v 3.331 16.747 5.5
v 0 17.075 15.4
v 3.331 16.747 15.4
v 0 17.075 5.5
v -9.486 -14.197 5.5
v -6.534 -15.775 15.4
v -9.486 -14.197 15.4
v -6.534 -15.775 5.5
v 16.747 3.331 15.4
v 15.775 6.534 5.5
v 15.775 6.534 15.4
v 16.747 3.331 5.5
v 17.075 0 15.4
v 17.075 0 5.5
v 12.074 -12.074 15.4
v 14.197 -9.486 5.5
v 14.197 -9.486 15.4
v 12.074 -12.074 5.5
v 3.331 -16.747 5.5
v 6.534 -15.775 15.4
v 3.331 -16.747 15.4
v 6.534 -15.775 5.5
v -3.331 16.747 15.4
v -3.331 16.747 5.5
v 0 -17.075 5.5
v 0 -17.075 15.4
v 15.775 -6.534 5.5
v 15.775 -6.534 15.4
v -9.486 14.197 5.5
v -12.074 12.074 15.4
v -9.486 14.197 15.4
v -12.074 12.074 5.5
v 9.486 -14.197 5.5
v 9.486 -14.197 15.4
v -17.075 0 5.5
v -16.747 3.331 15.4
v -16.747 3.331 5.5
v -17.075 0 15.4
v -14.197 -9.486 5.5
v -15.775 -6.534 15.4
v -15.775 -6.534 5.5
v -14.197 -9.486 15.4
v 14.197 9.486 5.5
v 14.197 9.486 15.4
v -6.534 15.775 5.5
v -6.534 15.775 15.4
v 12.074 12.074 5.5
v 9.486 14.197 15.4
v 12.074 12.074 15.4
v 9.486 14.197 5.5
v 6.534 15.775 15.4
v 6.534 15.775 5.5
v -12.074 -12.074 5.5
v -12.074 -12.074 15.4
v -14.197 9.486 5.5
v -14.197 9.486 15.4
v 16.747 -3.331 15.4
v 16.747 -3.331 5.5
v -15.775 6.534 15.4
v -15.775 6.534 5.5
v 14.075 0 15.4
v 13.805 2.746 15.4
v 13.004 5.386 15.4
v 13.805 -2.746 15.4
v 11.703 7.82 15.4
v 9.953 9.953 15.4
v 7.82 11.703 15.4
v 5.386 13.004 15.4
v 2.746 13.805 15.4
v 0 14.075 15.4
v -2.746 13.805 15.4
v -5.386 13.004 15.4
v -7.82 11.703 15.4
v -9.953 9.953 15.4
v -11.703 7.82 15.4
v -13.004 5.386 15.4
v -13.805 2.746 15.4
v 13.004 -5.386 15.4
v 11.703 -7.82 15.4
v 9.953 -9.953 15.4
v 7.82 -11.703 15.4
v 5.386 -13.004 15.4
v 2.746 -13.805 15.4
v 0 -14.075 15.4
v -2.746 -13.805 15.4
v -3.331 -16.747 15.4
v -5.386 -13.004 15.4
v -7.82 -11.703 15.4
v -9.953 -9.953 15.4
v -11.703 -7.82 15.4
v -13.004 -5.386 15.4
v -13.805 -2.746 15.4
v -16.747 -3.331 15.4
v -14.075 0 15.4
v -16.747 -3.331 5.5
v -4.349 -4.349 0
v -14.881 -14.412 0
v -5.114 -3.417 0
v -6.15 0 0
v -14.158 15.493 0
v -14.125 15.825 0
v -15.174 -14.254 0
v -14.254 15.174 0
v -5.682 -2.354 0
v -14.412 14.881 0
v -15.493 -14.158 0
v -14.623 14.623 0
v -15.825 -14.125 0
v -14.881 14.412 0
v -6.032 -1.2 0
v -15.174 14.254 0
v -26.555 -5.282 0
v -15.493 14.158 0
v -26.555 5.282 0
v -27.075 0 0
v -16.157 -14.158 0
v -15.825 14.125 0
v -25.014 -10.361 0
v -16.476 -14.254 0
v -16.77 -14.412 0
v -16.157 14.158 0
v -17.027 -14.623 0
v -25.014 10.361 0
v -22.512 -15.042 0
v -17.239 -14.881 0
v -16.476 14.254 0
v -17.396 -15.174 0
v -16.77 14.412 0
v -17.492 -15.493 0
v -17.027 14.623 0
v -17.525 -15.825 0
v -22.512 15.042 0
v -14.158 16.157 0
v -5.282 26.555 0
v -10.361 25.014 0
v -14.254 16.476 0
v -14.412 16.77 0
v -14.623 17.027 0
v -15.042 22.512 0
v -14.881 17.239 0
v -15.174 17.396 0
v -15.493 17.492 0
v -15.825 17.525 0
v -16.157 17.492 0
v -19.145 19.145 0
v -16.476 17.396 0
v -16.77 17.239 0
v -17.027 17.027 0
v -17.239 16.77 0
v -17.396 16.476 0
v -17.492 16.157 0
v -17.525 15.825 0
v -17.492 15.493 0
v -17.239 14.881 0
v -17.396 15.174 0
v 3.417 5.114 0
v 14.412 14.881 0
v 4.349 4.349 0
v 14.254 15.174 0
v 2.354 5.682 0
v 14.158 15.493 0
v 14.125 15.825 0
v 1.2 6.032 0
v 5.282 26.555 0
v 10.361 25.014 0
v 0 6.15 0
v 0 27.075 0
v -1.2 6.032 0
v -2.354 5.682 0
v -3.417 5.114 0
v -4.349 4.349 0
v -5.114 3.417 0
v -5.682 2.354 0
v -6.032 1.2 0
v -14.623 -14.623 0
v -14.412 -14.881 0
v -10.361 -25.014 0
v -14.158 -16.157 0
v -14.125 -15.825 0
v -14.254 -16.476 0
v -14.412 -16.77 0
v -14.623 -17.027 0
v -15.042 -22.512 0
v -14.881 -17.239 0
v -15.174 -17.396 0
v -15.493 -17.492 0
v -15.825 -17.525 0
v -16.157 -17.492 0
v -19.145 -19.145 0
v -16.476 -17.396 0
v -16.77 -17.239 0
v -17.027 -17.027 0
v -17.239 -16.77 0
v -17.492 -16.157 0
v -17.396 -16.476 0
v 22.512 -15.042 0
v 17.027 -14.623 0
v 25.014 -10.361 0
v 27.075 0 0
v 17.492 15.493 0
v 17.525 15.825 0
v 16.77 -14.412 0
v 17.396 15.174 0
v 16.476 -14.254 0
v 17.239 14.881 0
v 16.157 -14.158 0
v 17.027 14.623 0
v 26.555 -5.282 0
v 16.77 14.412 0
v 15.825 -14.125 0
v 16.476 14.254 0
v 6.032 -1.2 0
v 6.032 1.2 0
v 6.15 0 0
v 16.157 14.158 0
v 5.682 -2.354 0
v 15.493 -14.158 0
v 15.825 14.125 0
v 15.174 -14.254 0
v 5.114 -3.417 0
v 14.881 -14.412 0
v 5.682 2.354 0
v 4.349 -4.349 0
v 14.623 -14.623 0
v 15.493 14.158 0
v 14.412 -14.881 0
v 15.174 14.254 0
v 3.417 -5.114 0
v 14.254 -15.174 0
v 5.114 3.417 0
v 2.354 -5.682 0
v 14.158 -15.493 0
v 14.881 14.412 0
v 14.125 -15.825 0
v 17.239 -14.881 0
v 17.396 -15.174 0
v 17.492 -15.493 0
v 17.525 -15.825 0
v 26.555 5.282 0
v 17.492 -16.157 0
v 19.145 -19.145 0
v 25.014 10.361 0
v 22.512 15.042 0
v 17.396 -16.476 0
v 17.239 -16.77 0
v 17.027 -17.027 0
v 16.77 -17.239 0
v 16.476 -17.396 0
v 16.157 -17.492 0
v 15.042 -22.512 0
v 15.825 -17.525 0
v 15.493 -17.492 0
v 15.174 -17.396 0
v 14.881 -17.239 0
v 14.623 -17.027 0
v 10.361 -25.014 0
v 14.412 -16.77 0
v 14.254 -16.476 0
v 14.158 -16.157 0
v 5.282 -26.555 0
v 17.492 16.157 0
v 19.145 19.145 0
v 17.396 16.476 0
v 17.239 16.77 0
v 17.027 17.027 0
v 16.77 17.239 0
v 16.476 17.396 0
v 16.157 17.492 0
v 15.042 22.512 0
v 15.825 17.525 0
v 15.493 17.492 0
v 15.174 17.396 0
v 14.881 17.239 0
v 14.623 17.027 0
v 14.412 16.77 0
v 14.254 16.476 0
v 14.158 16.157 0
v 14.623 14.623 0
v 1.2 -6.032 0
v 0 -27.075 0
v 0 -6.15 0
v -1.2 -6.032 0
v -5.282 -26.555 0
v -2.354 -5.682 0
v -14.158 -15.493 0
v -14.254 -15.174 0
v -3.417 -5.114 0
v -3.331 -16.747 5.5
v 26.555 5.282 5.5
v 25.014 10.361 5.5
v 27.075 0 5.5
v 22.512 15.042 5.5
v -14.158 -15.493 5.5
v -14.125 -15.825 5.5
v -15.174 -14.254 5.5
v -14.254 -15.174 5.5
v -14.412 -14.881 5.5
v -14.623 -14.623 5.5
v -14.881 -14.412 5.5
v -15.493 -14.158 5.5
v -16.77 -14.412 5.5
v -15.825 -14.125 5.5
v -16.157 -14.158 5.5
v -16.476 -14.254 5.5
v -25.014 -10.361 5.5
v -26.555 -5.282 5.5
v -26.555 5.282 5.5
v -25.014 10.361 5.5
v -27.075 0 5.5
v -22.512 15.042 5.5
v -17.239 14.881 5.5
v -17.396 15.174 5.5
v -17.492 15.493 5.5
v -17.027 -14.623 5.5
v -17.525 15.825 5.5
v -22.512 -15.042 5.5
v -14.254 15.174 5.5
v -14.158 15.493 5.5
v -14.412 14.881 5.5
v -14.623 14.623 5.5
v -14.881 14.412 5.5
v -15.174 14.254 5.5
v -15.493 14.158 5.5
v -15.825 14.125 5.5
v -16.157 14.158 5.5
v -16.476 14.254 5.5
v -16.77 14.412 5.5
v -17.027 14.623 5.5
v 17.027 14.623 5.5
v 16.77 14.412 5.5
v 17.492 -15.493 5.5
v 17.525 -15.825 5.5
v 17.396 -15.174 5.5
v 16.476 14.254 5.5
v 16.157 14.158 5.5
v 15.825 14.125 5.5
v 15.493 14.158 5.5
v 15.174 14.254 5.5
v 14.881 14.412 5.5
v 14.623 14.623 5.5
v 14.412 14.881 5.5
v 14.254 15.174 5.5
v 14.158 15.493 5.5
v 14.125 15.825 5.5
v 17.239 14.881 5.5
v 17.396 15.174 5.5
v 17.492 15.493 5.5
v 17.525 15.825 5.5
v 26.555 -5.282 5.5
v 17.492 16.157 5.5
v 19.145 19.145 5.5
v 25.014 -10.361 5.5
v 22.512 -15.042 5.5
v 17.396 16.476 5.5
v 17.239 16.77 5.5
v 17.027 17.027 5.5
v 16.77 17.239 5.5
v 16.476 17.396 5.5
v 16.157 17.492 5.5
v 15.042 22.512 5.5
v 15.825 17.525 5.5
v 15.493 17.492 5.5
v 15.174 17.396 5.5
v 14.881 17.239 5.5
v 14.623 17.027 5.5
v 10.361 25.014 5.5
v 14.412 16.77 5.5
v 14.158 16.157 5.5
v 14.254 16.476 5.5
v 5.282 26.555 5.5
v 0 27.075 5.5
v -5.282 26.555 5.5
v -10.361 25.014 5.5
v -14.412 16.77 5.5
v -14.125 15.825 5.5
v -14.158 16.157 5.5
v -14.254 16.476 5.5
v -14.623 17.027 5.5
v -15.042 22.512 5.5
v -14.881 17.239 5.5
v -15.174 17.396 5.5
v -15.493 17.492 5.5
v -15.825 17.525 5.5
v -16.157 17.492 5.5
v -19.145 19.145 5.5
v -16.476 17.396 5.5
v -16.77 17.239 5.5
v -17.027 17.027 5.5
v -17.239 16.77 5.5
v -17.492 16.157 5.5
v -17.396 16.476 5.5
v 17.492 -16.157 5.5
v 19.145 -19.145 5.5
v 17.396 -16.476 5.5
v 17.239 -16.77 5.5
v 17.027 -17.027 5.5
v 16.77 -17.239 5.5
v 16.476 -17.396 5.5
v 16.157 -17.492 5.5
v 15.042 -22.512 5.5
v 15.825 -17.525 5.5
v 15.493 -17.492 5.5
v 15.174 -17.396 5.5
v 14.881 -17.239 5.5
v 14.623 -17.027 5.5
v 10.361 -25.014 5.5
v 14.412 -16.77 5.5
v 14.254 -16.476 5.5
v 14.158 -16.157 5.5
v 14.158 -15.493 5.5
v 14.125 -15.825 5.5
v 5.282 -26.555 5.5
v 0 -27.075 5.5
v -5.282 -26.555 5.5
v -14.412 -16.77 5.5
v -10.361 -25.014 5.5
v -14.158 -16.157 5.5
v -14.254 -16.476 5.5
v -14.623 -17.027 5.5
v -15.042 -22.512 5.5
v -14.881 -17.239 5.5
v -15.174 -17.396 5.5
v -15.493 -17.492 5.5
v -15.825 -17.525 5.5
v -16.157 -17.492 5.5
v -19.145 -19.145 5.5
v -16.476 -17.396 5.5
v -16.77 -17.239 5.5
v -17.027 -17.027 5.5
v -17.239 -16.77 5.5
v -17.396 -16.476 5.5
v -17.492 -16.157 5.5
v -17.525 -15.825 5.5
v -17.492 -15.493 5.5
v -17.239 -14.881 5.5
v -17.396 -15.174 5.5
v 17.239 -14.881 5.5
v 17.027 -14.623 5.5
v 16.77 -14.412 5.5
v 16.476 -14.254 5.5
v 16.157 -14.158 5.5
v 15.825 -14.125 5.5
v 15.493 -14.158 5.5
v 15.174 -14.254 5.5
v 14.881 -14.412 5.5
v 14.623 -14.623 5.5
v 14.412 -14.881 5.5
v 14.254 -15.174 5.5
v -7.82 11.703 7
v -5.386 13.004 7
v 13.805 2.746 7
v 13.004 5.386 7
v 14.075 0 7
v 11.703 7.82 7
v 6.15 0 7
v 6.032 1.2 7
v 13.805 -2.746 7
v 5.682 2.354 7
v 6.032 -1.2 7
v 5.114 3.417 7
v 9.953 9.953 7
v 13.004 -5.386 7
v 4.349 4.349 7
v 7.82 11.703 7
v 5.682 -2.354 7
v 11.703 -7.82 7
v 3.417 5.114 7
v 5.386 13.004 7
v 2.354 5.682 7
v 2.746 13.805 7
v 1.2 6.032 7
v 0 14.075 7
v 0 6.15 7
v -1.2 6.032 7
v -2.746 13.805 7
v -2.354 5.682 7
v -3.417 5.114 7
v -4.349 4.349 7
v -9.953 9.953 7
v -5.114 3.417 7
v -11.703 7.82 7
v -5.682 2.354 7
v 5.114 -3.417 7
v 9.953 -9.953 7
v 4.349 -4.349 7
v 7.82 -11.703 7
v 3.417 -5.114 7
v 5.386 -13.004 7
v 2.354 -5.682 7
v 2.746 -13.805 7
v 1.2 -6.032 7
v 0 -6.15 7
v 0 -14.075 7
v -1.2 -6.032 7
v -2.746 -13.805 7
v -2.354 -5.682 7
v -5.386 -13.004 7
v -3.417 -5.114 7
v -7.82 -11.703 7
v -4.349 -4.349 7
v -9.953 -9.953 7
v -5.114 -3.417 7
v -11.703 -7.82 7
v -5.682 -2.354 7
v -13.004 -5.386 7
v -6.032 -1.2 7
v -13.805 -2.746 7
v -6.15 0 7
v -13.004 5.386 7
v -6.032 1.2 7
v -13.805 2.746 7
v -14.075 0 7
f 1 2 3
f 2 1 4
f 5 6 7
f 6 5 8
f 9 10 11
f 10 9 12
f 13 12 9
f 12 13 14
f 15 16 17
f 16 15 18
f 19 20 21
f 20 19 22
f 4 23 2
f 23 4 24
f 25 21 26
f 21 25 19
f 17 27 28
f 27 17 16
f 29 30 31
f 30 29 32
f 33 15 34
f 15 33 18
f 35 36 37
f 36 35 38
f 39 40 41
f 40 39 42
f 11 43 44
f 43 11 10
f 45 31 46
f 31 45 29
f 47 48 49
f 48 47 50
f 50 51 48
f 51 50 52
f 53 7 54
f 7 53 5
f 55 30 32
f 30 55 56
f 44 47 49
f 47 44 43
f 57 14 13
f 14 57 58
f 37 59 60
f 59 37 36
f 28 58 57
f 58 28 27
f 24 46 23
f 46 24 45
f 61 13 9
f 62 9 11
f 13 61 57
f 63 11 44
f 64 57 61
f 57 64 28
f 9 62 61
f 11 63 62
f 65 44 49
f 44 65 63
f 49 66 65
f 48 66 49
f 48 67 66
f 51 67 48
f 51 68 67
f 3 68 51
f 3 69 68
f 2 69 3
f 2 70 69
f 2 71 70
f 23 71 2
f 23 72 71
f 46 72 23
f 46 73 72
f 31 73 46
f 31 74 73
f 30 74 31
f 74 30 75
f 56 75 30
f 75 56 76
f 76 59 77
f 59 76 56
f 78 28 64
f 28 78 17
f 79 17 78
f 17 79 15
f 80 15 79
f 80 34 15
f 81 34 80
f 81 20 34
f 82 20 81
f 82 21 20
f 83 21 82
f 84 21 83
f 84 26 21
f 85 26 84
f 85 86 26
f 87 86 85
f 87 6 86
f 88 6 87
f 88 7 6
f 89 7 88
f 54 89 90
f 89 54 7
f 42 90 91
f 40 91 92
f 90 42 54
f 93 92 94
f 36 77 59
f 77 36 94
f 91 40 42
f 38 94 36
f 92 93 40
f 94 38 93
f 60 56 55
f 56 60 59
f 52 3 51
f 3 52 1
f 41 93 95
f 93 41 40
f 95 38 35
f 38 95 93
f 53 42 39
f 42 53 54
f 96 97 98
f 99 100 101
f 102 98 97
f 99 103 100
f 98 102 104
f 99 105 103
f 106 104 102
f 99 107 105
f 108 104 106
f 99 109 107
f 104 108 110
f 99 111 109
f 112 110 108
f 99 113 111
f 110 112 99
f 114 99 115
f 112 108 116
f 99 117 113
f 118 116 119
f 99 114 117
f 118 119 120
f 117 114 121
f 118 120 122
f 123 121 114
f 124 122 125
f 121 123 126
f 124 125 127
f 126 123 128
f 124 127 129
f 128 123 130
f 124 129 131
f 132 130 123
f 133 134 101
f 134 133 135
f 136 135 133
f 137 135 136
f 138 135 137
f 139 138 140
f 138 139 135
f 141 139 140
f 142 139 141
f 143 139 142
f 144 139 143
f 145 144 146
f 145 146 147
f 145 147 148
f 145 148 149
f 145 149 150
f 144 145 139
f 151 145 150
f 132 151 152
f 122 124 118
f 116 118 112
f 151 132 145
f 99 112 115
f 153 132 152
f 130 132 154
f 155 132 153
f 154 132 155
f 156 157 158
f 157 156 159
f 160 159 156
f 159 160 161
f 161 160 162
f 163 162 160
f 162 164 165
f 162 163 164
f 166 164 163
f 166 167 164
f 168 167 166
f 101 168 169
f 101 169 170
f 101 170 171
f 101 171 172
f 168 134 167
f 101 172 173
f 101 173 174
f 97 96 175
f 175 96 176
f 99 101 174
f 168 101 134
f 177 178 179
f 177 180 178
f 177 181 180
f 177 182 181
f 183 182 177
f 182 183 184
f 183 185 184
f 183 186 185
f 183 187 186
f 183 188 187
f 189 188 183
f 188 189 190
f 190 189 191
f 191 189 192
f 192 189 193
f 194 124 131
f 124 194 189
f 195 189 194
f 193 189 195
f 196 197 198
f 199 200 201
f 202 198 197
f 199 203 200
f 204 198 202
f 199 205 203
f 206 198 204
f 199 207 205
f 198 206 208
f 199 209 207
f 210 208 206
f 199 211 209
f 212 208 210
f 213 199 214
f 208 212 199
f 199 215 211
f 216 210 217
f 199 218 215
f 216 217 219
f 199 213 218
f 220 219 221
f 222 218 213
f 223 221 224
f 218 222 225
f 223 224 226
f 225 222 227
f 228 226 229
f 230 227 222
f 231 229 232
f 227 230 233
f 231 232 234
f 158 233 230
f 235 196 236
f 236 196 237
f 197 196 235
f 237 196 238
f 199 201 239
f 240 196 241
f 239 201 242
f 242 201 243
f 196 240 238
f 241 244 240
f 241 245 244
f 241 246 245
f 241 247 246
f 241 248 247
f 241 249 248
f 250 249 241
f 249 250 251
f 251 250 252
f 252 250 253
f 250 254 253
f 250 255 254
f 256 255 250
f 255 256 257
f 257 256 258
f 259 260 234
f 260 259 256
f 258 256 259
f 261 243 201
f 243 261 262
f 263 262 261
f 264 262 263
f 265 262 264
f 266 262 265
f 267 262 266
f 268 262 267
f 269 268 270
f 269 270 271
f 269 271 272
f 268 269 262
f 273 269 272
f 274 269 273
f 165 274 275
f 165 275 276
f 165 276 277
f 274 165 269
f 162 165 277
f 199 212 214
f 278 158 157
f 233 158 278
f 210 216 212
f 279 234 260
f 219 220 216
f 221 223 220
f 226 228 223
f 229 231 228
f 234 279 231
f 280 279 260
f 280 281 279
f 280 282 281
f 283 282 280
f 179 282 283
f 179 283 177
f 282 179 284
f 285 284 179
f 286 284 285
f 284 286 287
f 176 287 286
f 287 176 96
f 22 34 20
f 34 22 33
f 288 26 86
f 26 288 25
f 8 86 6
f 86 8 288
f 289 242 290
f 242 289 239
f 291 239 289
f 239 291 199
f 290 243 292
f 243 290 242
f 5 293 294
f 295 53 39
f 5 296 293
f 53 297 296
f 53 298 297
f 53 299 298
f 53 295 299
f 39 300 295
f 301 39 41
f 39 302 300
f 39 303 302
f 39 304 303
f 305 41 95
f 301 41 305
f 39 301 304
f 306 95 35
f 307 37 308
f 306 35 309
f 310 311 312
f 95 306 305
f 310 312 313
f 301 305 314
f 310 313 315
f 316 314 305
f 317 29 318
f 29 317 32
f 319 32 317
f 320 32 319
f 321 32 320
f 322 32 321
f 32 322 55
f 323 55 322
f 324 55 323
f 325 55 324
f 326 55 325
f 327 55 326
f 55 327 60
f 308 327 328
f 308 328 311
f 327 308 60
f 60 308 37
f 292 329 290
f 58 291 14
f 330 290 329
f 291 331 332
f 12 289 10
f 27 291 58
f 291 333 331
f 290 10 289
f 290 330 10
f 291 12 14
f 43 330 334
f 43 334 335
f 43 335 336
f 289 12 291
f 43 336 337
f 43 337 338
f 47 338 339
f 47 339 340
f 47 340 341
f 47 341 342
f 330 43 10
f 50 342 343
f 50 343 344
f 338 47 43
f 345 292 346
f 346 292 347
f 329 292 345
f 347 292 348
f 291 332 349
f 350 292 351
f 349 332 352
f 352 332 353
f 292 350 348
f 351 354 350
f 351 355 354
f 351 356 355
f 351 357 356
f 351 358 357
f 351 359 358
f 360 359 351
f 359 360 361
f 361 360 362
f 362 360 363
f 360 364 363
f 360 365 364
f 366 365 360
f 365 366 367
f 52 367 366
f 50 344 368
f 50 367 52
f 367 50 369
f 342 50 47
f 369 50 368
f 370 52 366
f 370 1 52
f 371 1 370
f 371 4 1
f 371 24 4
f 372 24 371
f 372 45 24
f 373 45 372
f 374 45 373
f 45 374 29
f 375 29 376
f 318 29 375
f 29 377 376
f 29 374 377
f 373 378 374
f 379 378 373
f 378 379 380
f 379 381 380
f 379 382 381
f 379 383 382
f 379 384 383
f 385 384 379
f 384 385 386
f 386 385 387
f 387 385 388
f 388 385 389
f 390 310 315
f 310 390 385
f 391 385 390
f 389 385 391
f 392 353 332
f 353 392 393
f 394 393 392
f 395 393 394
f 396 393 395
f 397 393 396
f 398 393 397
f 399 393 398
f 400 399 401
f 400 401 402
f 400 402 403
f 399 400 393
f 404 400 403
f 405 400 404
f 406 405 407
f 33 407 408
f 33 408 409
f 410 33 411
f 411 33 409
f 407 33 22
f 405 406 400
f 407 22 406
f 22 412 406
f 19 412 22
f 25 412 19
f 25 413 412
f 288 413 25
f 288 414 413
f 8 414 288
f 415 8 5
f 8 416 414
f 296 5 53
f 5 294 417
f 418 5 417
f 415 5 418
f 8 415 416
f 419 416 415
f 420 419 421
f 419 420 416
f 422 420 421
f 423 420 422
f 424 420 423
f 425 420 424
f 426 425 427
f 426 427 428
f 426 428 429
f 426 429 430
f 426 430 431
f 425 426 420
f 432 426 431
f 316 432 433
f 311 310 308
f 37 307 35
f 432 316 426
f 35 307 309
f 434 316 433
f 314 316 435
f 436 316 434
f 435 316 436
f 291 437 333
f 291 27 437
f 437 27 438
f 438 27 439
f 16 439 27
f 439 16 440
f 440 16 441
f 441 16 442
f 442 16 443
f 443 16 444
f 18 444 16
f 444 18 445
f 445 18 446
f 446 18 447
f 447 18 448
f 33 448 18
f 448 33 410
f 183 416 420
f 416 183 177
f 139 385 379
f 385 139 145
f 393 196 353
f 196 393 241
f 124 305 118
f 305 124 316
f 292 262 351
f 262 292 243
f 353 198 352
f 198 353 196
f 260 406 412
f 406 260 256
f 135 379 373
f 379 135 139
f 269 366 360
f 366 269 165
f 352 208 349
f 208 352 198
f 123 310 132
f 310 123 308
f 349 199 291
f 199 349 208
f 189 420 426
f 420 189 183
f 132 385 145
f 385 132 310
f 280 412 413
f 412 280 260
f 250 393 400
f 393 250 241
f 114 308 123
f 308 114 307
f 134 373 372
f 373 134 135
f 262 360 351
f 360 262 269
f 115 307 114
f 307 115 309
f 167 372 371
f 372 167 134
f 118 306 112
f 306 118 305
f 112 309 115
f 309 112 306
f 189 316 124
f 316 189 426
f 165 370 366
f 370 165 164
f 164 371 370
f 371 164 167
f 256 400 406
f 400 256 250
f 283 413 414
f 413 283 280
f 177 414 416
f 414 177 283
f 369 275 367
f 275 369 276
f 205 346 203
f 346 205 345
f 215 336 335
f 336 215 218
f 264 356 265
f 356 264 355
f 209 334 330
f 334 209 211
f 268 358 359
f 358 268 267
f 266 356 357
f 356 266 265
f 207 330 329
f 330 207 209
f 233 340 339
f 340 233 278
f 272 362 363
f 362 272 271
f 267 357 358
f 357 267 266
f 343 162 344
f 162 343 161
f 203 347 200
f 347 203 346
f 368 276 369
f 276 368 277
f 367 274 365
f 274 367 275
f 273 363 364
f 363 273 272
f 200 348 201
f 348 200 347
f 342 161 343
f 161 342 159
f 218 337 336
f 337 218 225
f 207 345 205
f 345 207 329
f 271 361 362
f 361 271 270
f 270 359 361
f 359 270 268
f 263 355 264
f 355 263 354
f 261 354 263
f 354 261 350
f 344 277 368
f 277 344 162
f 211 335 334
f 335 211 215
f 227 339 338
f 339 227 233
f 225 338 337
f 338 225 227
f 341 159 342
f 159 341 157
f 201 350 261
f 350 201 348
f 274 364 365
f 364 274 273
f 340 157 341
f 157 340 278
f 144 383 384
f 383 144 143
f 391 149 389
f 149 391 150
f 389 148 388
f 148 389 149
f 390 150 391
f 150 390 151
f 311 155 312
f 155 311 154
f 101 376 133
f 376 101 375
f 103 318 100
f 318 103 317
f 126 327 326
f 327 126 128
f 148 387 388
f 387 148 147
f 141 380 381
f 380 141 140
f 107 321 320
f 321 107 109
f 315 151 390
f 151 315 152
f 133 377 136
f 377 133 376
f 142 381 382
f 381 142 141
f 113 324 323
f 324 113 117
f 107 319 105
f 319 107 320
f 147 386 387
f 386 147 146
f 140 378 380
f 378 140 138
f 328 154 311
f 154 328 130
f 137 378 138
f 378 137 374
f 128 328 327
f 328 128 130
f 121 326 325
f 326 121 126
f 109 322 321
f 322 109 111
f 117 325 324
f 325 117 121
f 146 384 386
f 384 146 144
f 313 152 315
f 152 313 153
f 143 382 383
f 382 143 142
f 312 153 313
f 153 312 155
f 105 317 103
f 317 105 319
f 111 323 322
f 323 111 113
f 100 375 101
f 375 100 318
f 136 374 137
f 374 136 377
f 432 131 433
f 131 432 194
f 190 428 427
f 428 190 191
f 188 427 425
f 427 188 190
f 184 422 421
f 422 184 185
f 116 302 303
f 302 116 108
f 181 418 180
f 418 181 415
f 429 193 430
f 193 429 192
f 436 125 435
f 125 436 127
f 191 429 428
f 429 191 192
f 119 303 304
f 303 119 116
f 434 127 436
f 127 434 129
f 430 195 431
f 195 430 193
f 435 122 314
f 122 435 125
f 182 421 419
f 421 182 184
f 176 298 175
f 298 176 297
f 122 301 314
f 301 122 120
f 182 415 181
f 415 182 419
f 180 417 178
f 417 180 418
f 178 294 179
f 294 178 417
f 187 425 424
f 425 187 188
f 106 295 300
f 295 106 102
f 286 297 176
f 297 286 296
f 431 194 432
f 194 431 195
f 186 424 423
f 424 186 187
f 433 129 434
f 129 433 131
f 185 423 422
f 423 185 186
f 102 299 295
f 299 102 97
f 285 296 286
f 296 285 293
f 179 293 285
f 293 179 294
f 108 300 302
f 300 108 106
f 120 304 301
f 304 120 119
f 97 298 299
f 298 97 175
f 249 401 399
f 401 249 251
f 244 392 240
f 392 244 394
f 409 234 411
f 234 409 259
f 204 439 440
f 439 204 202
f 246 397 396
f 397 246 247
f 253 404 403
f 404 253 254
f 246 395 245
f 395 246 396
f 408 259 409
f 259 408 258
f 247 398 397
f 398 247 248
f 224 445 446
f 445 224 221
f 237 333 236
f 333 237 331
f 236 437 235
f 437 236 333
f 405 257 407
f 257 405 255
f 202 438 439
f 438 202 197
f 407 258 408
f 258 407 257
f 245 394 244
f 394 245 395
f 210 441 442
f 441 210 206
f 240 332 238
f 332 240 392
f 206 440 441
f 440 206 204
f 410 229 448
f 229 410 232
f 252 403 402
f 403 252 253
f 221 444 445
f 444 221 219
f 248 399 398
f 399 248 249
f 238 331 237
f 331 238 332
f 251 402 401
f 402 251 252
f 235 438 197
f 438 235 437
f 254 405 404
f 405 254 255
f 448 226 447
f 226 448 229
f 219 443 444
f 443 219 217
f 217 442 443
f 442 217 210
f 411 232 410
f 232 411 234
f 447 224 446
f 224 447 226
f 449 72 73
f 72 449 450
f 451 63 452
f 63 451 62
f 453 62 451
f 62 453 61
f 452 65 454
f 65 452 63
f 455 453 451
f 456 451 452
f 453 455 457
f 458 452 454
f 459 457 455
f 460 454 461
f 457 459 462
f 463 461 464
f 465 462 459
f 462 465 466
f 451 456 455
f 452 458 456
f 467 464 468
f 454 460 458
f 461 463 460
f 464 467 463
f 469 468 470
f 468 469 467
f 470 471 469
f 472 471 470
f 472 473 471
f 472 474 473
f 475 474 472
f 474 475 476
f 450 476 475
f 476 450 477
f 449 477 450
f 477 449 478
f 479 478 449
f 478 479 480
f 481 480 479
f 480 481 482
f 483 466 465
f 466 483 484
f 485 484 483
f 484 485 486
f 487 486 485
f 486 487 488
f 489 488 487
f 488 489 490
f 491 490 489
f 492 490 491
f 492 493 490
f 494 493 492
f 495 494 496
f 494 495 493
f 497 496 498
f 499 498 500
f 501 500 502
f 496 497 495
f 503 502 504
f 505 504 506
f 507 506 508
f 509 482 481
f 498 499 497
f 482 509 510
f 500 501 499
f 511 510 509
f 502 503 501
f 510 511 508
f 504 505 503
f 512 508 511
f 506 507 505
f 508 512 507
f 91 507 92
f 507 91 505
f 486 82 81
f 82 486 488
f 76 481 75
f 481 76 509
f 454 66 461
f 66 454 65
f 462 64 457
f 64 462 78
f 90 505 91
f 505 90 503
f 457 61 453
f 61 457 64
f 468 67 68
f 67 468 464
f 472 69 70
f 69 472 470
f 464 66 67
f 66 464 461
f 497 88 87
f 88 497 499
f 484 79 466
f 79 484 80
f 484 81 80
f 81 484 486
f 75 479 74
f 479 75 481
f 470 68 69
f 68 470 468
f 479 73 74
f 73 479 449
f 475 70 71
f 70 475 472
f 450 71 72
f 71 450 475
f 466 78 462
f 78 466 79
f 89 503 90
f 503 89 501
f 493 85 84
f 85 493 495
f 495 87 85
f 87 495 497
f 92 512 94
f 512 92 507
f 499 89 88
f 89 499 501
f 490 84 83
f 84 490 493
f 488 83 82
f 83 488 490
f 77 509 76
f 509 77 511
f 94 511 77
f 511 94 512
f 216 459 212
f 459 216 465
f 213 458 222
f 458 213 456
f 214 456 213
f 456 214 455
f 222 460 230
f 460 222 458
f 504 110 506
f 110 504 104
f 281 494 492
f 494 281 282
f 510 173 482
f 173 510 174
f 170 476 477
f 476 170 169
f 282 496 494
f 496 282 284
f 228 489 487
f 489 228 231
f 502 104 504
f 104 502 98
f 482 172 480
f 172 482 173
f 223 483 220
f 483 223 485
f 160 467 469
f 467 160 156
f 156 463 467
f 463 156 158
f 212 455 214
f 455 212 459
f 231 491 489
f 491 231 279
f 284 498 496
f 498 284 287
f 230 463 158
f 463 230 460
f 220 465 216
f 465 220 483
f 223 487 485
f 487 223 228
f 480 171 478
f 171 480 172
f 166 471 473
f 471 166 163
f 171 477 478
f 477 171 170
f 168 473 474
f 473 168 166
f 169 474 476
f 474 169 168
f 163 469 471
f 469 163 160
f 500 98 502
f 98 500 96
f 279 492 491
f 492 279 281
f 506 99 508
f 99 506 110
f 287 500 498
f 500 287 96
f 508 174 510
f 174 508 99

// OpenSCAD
$fn = 32;

// ----------------------------------------------------------------------
// Bearing housing: seat for 6001 (28 x 8 mm), 34.15 mm body
// ----------------------------------------------------------------------

// --- parameters (mm) ---
body_od = 34.15;          // housing outside diameter
body_h = 15.4;            // overall housing height
wall = 3;                 // wall thickness
pocket_d = 28.15;         // 6001 seat, 0.15 mm clearance
seat_h = 8.4;             // pocket depth
shoulder = 3;             // shoulder under the bearing
pass_d = 12.3;            // shaft passage
flange_dia = 54.15;       // mounting flange diameter
flange_t = 4;             // flange thickness
bolt_d = 3.4;             // flange bolt clearance
bolt_r = 22.38;           // flange bolt circle radius

module body() {
  cylinder(h = body_h, d = body_od);
}

module flange() {
  /* flange sunk 1.5 mm into the body */
  cylinder(h = flange_t + 1.5, d = flange_dia);
}

difference() {
  union() {
    body();
    flange();
  }
  translate([0, 0, body_h - seat_h]) cylinder(h = seat_h + 1, d = pocket_d);
  translate([0, 0, -1]) cylinder(h = body_h - seat_h + 1, d = pass_d);
  for (i = [0 : 3]) rotate([0, 0, 45 + i * 90]) translate([bolt_r, 0, -1])
    cylinder(h = flange_t + 3, d = bolt_d);
}
